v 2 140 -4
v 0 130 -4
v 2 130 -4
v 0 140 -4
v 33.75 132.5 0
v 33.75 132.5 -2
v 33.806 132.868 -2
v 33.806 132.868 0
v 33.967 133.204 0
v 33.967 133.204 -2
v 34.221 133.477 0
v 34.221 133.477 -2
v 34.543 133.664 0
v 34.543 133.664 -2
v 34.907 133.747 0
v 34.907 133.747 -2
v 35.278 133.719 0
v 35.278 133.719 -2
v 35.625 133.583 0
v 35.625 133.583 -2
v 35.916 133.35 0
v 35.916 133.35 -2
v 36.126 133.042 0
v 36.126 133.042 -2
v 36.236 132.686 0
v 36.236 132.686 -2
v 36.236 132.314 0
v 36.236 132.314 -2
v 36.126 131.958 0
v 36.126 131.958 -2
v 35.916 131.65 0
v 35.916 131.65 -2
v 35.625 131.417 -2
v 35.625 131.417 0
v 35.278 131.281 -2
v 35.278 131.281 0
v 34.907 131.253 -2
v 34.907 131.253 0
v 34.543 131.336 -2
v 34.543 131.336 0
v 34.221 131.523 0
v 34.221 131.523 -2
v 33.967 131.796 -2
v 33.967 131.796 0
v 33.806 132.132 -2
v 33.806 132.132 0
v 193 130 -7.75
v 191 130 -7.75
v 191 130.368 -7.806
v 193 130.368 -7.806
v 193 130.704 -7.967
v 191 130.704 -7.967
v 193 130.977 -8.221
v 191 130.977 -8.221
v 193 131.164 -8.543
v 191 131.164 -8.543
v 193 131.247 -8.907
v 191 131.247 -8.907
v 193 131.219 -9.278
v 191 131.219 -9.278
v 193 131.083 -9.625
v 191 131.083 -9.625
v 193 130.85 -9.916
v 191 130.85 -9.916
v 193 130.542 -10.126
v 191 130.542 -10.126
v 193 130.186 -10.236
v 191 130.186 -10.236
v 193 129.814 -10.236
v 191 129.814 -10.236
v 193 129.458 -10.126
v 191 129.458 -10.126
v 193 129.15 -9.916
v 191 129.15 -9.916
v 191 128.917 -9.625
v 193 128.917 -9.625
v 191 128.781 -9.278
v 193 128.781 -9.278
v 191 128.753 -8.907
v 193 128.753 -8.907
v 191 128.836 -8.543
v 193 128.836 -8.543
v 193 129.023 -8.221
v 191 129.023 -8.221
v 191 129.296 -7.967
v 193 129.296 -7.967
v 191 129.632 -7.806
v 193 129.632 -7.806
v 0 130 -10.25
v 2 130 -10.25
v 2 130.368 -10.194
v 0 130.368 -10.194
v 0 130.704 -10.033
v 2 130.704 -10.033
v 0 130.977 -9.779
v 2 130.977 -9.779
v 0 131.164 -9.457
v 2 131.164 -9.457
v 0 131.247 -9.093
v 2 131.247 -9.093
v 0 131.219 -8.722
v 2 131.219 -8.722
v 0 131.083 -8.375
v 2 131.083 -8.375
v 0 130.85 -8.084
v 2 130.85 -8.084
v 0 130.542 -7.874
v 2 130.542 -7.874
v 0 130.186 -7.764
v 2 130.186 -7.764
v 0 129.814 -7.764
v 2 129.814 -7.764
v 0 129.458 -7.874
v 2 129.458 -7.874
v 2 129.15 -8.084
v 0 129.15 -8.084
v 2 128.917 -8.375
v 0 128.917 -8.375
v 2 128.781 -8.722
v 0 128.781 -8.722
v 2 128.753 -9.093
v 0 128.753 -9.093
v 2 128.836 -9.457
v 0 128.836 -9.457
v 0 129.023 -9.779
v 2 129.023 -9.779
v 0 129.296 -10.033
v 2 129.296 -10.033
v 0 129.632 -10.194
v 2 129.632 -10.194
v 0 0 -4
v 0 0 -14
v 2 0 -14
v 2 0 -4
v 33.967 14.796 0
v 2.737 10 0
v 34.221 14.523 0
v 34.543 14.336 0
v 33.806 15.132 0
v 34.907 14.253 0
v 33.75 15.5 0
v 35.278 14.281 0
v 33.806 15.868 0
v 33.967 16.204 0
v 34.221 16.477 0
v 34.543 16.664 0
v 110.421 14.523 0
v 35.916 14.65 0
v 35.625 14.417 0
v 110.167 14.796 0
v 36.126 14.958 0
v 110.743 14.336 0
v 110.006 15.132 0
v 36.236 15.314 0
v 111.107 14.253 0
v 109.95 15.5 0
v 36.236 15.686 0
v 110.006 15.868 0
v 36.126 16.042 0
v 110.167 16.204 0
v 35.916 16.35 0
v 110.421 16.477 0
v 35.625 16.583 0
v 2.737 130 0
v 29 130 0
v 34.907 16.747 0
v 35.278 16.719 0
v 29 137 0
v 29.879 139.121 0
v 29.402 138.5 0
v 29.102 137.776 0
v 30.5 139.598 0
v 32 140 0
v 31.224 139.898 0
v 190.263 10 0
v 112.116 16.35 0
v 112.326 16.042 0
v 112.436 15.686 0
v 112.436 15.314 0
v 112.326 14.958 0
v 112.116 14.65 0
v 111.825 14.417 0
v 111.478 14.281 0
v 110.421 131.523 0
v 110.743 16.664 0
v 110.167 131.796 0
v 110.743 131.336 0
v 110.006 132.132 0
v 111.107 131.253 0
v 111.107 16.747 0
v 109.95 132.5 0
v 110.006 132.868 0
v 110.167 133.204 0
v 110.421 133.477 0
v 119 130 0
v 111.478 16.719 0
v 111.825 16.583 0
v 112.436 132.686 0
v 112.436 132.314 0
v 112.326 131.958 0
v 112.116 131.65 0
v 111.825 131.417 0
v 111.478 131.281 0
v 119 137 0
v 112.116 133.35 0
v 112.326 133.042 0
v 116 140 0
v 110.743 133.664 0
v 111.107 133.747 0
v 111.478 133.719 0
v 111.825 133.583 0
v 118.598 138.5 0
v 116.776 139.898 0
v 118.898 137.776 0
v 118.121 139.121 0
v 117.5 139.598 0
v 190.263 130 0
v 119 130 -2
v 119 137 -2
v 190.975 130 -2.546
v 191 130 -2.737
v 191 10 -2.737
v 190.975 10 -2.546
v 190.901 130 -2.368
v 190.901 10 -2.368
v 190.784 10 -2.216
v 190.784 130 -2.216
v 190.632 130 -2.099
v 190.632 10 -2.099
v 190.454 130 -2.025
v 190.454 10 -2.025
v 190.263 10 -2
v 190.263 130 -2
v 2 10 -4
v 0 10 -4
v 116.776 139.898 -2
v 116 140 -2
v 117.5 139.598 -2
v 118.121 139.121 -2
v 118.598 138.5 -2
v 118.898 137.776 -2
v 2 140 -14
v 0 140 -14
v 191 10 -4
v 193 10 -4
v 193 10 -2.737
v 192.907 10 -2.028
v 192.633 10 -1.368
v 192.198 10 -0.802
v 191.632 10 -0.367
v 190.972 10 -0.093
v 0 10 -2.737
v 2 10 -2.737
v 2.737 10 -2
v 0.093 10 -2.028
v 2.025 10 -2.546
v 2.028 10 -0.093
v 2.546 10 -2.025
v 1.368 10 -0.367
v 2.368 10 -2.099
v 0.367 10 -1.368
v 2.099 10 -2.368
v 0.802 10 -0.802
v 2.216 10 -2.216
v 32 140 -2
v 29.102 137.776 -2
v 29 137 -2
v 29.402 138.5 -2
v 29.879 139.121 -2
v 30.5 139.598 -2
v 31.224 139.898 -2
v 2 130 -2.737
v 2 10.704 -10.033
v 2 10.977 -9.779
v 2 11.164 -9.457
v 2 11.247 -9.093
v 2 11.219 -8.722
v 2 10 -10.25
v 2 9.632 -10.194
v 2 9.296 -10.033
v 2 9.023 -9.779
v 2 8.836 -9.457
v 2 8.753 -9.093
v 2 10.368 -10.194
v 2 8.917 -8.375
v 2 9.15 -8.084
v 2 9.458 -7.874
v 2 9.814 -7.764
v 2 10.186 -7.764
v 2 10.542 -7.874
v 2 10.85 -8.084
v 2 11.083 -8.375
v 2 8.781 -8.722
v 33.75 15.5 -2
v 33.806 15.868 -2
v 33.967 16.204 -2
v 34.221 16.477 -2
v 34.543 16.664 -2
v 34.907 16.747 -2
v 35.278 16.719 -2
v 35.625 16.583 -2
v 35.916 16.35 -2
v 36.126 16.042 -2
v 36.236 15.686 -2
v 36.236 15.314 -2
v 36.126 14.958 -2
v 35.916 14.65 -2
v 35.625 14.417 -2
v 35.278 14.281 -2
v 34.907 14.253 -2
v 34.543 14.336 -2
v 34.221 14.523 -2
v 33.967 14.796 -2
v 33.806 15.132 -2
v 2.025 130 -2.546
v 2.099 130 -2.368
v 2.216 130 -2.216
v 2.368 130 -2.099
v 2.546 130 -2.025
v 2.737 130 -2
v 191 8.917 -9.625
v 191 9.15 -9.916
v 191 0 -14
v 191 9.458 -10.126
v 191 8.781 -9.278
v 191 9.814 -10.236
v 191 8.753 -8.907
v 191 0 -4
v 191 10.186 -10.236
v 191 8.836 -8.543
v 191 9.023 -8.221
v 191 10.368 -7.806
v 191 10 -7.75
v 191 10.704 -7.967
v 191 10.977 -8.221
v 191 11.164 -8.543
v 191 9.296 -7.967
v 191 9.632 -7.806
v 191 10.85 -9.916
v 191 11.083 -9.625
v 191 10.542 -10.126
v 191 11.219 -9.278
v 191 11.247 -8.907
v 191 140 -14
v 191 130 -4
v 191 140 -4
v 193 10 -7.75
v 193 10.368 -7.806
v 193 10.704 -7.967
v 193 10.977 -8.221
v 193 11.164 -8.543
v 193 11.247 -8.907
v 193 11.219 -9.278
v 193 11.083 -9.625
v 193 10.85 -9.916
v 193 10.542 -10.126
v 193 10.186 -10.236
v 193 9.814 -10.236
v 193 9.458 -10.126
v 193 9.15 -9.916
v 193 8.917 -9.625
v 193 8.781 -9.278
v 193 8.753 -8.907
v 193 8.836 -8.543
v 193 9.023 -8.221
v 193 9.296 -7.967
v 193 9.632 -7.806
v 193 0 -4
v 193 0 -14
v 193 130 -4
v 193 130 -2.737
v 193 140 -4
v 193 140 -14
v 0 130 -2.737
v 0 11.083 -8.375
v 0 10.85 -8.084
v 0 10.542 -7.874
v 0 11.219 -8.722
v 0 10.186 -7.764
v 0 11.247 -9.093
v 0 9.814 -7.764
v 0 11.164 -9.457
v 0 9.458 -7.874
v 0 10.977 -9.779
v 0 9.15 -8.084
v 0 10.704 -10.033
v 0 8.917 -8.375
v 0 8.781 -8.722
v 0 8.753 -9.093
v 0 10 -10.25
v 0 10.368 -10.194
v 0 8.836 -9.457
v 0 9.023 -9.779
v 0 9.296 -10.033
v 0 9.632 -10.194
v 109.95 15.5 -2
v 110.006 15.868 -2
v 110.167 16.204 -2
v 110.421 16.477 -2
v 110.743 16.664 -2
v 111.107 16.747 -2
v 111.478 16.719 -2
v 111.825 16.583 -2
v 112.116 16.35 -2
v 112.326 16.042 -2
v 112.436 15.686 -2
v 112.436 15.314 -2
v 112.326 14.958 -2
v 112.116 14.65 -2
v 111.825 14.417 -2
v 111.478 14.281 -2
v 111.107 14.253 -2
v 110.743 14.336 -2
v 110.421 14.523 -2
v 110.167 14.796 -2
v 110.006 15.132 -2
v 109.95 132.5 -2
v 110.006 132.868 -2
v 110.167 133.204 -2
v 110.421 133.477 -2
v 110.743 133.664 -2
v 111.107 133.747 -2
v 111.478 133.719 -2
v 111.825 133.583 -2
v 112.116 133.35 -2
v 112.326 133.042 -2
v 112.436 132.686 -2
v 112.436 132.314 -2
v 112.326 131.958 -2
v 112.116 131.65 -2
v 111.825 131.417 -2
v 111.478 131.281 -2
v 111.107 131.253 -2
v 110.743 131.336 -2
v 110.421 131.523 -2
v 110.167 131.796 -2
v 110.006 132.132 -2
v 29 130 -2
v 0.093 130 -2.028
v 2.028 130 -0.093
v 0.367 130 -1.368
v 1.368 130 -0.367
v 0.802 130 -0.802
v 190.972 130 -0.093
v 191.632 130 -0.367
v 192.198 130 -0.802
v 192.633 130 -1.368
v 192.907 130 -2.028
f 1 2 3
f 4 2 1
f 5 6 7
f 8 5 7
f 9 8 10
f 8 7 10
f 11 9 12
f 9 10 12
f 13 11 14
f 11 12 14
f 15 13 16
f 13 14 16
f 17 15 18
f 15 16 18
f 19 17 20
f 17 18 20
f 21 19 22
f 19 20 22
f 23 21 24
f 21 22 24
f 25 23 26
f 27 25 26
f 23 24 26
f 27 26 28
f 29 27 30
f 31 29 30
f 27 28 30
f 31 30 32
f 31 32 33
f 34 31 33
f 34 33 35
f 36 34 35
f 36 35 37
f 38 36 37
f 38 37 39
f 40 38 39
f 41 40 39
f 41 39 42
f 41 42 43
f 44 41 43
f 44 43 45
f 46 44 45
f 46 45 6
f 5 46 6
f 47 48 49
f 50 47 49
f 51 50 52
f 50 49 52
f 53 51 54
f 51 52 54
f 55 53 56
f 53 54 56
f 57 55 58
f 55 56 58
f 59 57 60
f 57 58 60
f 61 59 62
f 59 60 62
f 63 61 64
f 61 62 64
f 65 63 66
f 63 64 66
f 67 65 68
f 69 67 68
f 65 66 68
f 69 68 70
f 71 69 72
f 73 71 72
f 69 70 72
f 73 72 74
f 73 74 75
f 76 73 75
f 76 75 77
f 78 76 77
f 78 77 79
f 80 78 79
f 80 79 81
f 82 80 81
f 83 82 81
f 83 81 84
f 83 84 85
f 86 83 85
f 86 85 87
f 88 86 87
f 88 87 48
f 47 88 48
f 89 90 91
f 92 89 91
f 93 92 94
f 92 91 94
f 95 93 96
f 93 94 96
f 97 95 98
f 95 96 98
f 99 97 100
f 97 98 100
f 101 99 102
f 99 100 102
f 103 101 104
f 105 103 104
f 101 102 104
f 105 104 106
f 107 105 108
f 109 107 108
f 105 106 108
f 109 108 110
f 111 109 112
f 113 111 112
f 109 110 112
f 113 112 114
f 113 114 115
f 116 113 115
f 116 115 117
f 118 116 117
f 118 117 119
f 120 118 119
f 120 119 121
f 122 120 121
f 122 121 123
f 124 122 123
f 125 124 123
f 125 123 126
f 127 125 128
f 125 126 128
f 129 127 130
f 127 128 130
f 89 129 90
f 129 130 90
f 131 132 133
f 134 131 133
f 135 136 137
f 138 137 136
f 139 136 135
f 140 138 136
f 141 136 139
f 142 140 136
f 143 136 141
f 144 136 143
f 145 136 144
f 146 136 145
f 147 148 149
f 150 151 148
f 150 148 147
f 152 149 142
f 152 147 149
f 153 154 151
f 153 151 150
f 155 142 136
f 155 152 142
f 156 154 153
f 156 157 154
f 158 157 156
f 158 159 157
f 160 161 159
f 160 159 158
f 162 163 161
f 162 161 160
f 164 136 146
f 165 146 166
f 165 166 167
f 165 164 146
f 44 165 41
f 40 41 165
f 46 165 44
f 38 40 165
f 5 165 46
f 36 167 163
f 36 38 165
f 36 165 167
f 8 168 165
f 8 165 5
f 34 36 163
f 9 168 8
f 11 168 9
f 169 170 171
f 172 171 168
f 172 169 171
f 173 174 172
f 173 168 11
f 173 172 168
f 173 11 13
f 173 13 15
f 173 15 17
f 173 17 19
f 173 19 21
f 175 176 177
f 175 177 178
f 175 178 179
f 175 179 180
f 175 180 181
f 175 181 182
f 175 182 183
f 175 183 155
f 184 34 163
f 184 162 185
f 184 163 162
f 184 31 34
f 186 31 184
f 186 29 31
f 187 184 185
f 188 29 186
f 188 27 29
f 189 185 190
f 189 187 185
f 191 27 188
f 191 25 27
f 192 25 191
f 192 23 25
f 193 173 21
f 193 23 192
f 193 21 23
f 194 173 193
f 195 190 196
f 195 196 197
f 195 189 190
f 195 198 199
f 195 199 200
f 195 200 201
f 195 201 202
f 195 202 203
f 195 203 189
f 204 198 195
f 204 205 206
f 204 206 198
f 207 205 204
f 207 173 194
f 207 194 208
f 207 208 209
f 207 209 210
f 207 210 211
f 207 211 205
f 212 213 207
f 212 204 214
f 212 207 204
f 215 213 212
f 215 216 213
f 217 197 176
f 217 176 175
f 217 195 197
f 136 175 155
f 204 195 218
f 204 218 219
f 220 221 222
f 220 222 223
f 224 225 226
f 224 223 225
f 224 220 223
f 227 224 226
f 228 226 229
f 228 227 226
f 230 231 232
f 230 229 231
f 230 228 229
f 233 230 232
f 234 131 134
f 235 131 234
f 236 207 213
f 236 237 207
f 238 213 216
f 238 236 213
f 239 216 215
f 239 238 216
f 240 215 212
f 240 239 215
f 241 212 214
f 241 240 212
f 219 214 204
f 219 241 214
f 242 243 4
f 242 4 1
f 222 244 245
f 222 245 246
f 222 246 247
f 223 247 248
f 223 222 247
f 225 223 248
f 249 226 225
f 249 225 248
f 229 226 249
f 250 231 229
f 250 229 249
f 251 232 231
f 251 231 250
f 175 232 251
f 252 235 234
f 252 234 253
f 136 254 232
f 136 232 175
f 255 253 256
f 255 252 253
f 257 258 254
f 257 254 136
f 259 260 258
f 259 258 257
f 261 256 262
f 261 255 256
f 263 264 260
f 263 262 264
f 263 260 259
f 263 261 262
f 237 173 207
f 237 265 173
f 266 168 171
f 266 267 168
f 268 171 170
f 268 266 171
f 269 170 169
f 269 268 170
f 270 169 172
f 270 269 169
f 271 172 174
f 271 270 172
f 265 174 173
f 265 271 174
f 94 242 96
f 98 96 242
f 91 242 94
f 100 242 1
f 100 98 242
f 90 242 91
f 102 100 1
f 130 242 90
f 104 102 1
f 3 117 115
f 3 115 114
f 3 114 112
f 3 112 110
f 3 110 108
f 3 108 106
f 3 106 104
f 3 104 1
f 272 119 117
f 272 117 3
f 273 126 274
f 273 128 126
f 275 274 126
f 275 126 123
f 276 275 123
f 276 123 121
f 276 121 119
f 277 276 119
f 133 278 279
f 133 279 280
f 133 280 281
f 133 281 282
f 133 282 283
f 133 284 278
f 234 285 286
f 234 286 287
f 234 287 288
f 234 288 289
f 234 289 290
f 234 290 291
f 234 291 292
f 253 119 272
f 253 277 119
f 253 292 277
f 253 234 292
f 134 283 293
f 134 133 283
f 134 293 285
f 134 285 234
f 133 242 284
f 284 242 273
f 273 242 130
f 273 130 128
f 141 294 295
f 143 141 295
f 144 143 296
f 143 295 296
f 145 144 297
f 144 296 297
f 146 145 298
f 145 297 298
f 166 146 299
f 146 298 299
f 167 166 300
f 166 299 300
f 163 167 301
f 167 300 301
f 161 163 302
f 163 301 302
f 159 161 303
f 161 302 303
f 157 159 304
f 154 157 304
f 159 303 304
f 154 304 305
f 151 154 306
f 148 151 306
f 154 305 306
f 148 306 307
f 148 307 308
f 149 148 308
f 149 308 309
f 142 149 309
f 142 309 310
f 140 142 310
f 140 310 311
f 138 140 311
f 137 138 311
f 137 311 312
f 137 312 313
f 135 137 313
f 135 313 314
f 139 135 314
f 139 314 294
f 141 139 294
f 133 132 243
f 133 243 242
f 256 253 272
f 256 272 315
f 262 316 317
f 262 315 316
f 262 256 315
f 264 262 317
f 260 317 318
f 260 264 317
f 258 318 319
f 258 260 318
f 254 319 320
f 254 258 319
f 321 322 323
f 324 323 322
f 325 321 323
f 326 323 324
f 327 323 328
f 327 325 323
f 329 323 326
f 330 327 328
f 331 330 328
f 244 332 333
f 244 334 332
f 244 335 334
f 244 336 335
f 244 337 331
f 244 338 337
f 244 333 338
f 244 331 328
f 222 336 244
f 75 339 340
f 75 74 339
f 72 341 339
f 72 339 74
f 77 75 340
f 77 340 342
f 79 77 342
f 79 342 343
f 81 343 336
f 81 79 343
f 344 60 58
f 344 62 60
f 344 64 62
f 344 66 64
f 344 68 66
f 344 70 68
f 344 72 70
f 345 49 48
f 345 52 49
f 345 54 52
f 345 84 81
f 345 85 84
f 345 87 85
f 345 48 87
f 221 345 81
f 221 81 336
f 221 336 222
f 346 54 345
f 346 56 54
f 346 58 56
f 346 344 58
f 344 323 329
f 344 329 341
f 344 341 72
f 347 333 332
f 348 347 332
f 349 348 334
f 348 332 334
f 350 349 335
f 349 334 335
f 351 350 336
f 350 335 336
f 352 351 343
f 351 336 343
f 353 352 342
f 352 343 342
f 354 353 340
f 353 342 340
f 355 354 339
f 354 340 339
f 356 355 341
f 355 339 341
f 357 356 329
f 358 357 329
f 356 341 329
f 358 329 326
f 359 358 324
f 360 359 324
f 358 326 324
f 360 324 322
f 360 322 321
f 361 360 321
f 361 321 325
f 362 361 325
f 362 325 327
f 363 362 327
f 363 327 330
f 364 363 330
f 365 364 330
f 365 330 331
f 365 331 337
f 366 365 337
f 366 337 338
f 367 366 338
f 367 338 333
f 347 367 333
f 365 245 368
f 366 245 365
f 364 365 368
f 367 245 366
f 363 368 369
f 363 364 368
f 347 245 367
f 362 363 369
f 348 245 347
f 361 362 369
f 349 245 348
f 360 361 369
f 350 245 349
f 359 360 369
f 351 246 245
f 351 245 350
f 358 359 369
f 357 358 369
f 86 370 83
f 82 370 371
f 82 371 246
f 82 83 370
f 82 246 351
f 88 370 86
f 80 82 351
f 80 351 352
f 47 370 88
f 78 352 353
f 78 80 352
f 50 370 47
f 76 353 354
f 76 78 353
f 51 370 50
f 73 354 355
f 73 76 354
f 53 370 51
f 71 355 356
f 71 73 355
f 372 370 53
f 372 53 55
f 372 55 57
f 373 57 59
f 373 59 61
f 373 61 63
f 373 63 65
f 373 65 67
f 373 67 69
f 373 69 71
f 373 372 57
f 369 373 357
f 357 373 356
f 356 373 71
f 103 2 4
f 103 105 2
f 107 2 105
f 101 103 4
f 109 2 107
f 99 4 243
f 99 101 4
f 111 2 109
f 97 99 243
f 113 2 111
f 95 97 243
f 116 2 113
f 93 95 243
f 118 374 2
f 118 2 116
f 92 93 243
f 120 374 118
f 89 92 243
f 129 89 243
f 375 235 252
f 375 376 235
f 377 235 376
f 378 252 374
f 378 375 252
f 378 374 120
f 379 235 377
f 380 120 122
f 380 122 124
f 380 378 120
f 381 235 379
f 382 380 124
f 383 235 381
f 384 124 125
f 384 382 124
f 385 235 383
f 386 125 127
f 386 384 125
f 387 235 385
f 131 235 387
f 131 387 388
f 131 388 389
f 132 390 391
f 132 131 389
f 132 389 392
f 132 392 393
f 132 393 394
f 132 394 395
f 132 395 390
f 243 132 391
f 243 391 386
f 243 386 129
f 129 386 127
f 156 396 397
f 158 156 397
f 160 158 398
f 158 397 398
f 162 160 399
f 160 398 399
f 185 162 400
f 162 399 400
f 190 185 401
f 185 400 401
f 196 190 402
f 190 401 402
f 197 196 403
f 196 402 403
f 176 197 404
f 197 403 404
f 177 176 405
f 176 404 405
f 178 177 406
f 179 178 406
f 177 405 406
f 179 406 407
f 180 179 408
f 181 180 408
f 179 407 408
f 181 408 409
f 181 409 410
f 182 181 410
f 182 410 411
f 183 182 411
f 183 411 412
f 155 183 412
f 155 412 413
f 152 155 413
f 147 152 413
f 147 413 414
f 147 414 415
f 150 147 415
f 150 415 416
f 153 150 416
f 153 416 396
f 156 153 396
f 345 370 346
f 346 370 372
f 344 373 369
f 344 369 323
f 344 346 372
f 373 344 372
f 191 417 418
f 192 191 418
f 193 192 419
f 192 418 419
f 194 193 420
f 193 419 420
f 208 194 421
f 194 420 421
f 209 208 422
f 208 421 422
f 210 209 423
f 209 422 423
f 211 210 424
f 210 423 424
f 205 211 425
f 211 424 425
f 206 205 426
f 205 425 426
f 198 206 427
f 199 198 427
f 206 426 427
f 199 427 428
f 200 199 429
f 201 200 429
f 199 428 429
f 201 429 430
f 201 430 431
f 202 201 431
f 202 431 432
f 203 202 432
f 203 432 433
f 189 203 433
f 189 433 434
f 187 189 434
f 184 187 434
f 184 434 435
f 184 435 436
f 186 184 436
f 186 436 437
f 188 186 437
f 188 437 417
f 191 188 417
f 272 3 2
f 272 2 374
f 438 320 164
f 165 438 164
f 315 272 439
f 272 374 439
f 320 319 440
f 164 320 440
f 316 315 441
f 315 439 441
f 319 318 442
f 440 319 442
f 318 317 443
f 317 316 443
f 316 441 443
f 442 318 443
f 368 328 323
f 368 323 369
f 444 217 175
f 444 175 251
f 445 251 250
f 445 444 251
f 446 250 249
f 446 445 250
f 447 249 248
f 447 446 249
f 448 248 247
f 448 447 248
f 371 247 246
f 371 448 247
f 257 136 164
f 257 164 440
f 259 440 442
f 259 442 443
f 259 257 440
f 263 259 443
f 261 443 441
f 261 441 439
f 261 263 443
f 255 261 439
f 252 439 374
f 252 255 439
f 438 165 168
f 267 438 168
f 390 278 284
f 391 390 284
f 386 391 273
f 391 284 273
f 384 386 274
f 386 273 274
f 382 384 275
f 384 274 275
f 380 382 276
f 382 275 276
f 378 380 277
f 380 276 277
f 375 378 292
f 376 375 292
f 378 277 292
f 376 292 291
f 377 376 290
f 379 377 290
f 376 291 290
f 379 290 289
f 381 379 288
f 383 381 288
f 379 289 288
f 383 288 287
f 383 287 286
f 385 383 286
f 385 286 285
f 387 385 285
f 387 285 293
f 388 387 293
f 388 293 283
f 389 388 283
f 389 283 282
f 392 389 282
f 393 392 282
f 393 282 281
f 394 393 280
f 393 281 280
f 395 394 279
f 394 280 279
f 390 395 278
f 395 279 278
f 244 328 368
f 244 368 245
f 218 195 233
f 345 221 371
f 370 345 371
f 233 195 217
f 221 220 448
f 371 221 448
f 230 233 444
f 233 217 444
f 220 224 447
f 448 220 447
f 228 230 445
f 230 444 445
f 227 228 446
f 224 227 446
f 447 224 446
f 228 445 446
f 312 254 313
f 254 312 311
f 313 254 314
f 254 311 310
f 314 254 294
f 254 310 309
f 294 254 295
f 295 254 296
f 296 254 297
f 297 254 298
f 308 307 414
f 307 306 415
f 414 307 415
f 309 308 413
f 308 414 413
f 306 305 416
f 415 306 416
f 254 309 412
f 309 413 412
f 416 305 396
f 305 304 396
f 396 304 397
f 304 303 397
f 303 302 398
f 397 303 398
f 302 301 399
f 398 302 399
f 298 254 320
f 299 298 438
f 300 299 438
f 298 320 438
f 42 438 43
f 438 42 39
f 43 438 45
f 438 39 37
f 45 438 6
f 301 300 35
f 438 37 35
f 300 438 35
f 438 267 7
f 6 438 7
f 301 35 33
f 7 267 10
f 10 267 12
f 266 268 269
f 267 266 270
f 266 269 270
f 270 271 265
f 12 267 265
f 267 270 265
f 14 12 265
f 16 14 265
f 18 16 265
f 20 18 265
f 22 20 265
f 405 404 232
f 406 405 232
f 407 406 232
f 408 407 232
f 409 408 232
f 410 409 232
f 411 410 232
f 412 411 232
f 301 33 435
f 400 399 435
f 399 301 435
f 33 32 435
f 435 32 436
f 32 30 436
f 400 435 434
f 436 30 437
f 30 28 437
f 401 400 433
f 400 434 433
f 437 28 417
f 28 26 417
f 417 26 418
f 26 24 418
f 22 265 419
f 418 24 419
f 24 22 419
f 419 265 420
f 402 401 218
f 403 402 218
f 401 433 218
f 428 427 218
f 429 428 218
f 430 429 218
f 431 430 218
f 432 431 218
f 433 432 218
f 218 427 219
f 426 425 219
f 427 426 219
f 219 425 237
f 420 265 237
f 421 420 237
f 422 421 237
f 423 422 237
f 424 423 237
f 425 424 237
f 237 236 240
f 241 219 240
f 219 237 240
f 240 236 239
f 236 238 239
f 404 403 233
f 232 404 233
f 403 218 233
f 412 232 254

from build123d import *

# Parameters (mm, degrees)
SKETCH_3_W                         = 193
SKETCH_3_H                         = 140
SM_BASE_FLANGE_1_DEPTH             = 2
SM_EDGE_FLANGE_1_STRIP_W           = 9.4732
SM_EDGE_FLANGE_1_STRIP_H           = 2
SM_EDGE_FLANGE_1_STRIP_CUT_DEPTH   = 140
SM_EDGE_FLANGE_1_STRIP_2_W         = 9.4732
SM_EDGE_FLANGE_1_STRIP_2_H         = 2
SM_EDGE_FLANGE_1_STRIP_CUT_2_DEPTH = 140
SM_EDGE_FLANGE_1_DEPTH             = 140
SM_EDGE_FLANGE_1_BEND_DEPTH        = 140
HOLE_WIZARD_M3_2_D                 = 2.5
HOLE_WIZARD_M3_3_D                 = 2.5
HOLE_WIZARD_M3_3_DEPTH             = 2
HOLE_WIZARD_M3_4_D                 = 2.5
SKETCH_23_W                        = 185
SKETCH_23_H                        = 10
SKETCH_23_W_2                      = 25
SKETCH_23_W_3                      = 70
CUT_EXTRUDE_1_DEPTH                = 10
FILLET_1_R                         = 3
SKETCH_24_W                        = 4
SKETCH_24_H                        = 10
CUT_EXTRUDE_2_DEPTH                = 239.840951263
SKETCH_25_W                        = 4
SKETCH_25_H                        = 10
CUT_EXTRUDE_3_DEPTH                = 10
SKETCH_26_W                        = 4
SKETCH_26_H                        = 10
CUT_EXTRUDE_4_DEPTH                = 10


# Sheet-metal steps are written as plain solids
with BuildPart() as part:
    # ｽｹｯﾁ3 → ﾍﾞｰｽ-ﾌﾗﾝｼﾞ1 (new body)
    with BuildSketch(Plane.XY):
        with Locations((96.5, 70)):
            Rectangle(SKETCH_3_W, SKETCH_3_H)
    extrude(amount=-SM_BASE_FLANGE_1_DEPTH)

    # ｴｯｼﾞ-ﾌﾗﾝｼﾞ1 strip (across the edge) → ｴｯｼﾞ-ﾌﾗﾝｼﾞ1 strip cut (cut)
    with BuildSketch(Plane(origin=(0, 0, -2), x_dir=(1, 0, 0), z_dir=(0, 1, 0))):
        with Locations((-2, -1)):
            Rectangle(SM_EDGE_FLANGE_1_STRIP_W, SM_EDGE_FLANGE_1_STRIP_H)
    extrude(amount=SM_EDGE_FLANGE_1_STRIP_CUT_DEPTH, mode=Mode.SUBTRACT)

    # ｴｯｼﾞ-ﾌﾗﾝｼﾞ1 strip 2 (across the edge) → ｴｯｼﾞ-ﾌﾗﾝｼﾞ1 strip cut 2 (cut)
    with BuildSketch(Plane(origin=(193, 140, -2), x_dir=(-1, 0, 0), z_dir=(0, -1, 0))):
        with Locations((-2, -1)):
            Rectangle(SM_EDGE_FLANGE_1_STRIP_2_W, SM_EDGE_FLANGE_1_STRIP_2_H)
    extrude(amount=SM_EDGE_FLANGE_1_STRIP_CUT_2_DEPTH, mode=Mode.SUBTRACT)

    # ｴｯｼﾞ-ﾌﾗﾝｼﾞ1 section (across the edge) → ｴｯｼﾞ-ﾌﾗﾝｼﾞ1 (add)
    with BuildSketch(Plane(origin=(0, 0, -2), x_dir=(1, 0, 0), z_dir=(0, 1, 0))):
        with BuildLine():
            Line((0, 0.7366), (0, 12))
            Line((0, 12), (2, 12))
            Line((2, 12), (2, 0.7366))
            ThreePointArc((2, 0.7366), (2.215745145, 0.215745145), (2.7366, 0))
            Line((2.7366, 0), (2.7366, -2))
            ThreePointArc((2.7366, -2), (0.801531583, -1.198468417), (0, 0.7366))
        make_face()
    extrude(amount=SM_EDGE_FLANGE_1_DEPTH)

    # ｴｯｼﾞ-ﾌﾗﾝｼﾞ1 section 2 (across the edge) → ｴｯｼﾞ-ﾌﾗﾝｼﾞ1 bend (add)
    with BuildSketch(Plane(origin=(193, 140, -2), x_dir=(-1, 0, 0), z_dir=(0, -1, 0))):
        with BuildLine():
            Line((0, 0.7366), (0, 12))
            Line((0, 12), (2, 12))
            Line((2, 12), (2, 0.7366))
            ThreePointArc((2, 0.7366), (2.215745145, 0.215745145), (2.7366, 0))
            Line((2.7366, 0), (2.7366, -2))
            ThreePointArc((2.7366, -2), (0.801531583, -1.198468417), (0, 0.7366))
        make_face()
    extrude(amount=SM_EDGE_FLANGE_1_BEND_DEPTH)

    # M3 ねじ穴2 (through all)
    with Locations(Plane.XY):
        with Locations((35, 132.5), (35, 15.5), (111.2, 15.5), (111.2, 132.5)):
            Hole(HOLE_WIZARD_M3_2_D / 2)

    # M3 ねじ穴3
    with Locations(Plane.ZY):
        with Locations((-9, 130), (-9, 10)):
            Hole(HOLE_WIZARD_M3_3_D / 2, depth=HOLE_WIZARD_M3_3_DEPTH)

    # M3 ねじ穴4 (through all)
    with Locations(Plane(origin=(193, 0, 0), x_dir=(0, 0, -1), z_dir=(1, 0, 0))):
        with Locations((9, 130), (9, 10)):
            Hole(HOLE_WIZARD_M3_4_D / 2)

    # ｽｹｯﾁ23 → ｶｯﾄ - 押し出し1 (cut)
    with BuildSketch(Plane.XY):
        with Locations((96.5, 5)):
            Rectangle(SKETCH_23_W, SKETCH_23_H)
        with Locations((16.5, 135)):
            Rectangle(SKETCH_23_W_2, SKETCH_23_H)
        with Locations((154, 135)):
            Rectangle(SKETCH_23_W_3, SKETCH_23_H)
    extrude(amount=-CUT_EXTRUDE_1_DEPTH, mode=Mode.SUBTRACT)

    # ﾌｨﾚｯﾄ1
    fillet_1_edges = [part.edges().sort_by_distance(p)[0] for p in [
        (29, 140, -1),
        (119, 140, -1),
    ]]
    fillet(fillet_1_edges, radius=FILLET_1_R)

    # ｽｹｯﾁ24 → ｶｯﾄ - 押し出し2 (cut, through all)
    with BuildSketch(Plane.ZY):
        with Locations((-2, 5)):
            Rectangle(SKETCH_24_W, SKETCH_24_H)
    extrude(amount=-CUT_EXTRUDE_2_DEPTH, mode=Mode.SUBTRACT)

    # ｽｹｯﾁ25 → ｶｯﾄ - 押し出し3 (cut)
    with BuildSketch(Plane.ZY):
        with Locations((-2, 135)):
            Rectangle(SKETCH_25_W, SKETCH_25_H)
    extrude(amount=-CUT_EXTRUDE_3_DEPTH, mode=Mode.SUBTRACT)

    # ｽｹｯﾁ26 → ｶｯﾄ - 押し出し4 (cut)
    with BuildSketch(Plane(origin=(193, 0, 0), x_dir=(0, 0, -1), z_dir=(1, 0, 0))):
        with Locations((2, 135)):
            Rectangle(SKETCH_26_W, SKETCH_26_H)
    extrude(amount=-CUT_EXTRUDE_4_DEPTH, mode=Mode.SUBTRACT)


solid = part.part
